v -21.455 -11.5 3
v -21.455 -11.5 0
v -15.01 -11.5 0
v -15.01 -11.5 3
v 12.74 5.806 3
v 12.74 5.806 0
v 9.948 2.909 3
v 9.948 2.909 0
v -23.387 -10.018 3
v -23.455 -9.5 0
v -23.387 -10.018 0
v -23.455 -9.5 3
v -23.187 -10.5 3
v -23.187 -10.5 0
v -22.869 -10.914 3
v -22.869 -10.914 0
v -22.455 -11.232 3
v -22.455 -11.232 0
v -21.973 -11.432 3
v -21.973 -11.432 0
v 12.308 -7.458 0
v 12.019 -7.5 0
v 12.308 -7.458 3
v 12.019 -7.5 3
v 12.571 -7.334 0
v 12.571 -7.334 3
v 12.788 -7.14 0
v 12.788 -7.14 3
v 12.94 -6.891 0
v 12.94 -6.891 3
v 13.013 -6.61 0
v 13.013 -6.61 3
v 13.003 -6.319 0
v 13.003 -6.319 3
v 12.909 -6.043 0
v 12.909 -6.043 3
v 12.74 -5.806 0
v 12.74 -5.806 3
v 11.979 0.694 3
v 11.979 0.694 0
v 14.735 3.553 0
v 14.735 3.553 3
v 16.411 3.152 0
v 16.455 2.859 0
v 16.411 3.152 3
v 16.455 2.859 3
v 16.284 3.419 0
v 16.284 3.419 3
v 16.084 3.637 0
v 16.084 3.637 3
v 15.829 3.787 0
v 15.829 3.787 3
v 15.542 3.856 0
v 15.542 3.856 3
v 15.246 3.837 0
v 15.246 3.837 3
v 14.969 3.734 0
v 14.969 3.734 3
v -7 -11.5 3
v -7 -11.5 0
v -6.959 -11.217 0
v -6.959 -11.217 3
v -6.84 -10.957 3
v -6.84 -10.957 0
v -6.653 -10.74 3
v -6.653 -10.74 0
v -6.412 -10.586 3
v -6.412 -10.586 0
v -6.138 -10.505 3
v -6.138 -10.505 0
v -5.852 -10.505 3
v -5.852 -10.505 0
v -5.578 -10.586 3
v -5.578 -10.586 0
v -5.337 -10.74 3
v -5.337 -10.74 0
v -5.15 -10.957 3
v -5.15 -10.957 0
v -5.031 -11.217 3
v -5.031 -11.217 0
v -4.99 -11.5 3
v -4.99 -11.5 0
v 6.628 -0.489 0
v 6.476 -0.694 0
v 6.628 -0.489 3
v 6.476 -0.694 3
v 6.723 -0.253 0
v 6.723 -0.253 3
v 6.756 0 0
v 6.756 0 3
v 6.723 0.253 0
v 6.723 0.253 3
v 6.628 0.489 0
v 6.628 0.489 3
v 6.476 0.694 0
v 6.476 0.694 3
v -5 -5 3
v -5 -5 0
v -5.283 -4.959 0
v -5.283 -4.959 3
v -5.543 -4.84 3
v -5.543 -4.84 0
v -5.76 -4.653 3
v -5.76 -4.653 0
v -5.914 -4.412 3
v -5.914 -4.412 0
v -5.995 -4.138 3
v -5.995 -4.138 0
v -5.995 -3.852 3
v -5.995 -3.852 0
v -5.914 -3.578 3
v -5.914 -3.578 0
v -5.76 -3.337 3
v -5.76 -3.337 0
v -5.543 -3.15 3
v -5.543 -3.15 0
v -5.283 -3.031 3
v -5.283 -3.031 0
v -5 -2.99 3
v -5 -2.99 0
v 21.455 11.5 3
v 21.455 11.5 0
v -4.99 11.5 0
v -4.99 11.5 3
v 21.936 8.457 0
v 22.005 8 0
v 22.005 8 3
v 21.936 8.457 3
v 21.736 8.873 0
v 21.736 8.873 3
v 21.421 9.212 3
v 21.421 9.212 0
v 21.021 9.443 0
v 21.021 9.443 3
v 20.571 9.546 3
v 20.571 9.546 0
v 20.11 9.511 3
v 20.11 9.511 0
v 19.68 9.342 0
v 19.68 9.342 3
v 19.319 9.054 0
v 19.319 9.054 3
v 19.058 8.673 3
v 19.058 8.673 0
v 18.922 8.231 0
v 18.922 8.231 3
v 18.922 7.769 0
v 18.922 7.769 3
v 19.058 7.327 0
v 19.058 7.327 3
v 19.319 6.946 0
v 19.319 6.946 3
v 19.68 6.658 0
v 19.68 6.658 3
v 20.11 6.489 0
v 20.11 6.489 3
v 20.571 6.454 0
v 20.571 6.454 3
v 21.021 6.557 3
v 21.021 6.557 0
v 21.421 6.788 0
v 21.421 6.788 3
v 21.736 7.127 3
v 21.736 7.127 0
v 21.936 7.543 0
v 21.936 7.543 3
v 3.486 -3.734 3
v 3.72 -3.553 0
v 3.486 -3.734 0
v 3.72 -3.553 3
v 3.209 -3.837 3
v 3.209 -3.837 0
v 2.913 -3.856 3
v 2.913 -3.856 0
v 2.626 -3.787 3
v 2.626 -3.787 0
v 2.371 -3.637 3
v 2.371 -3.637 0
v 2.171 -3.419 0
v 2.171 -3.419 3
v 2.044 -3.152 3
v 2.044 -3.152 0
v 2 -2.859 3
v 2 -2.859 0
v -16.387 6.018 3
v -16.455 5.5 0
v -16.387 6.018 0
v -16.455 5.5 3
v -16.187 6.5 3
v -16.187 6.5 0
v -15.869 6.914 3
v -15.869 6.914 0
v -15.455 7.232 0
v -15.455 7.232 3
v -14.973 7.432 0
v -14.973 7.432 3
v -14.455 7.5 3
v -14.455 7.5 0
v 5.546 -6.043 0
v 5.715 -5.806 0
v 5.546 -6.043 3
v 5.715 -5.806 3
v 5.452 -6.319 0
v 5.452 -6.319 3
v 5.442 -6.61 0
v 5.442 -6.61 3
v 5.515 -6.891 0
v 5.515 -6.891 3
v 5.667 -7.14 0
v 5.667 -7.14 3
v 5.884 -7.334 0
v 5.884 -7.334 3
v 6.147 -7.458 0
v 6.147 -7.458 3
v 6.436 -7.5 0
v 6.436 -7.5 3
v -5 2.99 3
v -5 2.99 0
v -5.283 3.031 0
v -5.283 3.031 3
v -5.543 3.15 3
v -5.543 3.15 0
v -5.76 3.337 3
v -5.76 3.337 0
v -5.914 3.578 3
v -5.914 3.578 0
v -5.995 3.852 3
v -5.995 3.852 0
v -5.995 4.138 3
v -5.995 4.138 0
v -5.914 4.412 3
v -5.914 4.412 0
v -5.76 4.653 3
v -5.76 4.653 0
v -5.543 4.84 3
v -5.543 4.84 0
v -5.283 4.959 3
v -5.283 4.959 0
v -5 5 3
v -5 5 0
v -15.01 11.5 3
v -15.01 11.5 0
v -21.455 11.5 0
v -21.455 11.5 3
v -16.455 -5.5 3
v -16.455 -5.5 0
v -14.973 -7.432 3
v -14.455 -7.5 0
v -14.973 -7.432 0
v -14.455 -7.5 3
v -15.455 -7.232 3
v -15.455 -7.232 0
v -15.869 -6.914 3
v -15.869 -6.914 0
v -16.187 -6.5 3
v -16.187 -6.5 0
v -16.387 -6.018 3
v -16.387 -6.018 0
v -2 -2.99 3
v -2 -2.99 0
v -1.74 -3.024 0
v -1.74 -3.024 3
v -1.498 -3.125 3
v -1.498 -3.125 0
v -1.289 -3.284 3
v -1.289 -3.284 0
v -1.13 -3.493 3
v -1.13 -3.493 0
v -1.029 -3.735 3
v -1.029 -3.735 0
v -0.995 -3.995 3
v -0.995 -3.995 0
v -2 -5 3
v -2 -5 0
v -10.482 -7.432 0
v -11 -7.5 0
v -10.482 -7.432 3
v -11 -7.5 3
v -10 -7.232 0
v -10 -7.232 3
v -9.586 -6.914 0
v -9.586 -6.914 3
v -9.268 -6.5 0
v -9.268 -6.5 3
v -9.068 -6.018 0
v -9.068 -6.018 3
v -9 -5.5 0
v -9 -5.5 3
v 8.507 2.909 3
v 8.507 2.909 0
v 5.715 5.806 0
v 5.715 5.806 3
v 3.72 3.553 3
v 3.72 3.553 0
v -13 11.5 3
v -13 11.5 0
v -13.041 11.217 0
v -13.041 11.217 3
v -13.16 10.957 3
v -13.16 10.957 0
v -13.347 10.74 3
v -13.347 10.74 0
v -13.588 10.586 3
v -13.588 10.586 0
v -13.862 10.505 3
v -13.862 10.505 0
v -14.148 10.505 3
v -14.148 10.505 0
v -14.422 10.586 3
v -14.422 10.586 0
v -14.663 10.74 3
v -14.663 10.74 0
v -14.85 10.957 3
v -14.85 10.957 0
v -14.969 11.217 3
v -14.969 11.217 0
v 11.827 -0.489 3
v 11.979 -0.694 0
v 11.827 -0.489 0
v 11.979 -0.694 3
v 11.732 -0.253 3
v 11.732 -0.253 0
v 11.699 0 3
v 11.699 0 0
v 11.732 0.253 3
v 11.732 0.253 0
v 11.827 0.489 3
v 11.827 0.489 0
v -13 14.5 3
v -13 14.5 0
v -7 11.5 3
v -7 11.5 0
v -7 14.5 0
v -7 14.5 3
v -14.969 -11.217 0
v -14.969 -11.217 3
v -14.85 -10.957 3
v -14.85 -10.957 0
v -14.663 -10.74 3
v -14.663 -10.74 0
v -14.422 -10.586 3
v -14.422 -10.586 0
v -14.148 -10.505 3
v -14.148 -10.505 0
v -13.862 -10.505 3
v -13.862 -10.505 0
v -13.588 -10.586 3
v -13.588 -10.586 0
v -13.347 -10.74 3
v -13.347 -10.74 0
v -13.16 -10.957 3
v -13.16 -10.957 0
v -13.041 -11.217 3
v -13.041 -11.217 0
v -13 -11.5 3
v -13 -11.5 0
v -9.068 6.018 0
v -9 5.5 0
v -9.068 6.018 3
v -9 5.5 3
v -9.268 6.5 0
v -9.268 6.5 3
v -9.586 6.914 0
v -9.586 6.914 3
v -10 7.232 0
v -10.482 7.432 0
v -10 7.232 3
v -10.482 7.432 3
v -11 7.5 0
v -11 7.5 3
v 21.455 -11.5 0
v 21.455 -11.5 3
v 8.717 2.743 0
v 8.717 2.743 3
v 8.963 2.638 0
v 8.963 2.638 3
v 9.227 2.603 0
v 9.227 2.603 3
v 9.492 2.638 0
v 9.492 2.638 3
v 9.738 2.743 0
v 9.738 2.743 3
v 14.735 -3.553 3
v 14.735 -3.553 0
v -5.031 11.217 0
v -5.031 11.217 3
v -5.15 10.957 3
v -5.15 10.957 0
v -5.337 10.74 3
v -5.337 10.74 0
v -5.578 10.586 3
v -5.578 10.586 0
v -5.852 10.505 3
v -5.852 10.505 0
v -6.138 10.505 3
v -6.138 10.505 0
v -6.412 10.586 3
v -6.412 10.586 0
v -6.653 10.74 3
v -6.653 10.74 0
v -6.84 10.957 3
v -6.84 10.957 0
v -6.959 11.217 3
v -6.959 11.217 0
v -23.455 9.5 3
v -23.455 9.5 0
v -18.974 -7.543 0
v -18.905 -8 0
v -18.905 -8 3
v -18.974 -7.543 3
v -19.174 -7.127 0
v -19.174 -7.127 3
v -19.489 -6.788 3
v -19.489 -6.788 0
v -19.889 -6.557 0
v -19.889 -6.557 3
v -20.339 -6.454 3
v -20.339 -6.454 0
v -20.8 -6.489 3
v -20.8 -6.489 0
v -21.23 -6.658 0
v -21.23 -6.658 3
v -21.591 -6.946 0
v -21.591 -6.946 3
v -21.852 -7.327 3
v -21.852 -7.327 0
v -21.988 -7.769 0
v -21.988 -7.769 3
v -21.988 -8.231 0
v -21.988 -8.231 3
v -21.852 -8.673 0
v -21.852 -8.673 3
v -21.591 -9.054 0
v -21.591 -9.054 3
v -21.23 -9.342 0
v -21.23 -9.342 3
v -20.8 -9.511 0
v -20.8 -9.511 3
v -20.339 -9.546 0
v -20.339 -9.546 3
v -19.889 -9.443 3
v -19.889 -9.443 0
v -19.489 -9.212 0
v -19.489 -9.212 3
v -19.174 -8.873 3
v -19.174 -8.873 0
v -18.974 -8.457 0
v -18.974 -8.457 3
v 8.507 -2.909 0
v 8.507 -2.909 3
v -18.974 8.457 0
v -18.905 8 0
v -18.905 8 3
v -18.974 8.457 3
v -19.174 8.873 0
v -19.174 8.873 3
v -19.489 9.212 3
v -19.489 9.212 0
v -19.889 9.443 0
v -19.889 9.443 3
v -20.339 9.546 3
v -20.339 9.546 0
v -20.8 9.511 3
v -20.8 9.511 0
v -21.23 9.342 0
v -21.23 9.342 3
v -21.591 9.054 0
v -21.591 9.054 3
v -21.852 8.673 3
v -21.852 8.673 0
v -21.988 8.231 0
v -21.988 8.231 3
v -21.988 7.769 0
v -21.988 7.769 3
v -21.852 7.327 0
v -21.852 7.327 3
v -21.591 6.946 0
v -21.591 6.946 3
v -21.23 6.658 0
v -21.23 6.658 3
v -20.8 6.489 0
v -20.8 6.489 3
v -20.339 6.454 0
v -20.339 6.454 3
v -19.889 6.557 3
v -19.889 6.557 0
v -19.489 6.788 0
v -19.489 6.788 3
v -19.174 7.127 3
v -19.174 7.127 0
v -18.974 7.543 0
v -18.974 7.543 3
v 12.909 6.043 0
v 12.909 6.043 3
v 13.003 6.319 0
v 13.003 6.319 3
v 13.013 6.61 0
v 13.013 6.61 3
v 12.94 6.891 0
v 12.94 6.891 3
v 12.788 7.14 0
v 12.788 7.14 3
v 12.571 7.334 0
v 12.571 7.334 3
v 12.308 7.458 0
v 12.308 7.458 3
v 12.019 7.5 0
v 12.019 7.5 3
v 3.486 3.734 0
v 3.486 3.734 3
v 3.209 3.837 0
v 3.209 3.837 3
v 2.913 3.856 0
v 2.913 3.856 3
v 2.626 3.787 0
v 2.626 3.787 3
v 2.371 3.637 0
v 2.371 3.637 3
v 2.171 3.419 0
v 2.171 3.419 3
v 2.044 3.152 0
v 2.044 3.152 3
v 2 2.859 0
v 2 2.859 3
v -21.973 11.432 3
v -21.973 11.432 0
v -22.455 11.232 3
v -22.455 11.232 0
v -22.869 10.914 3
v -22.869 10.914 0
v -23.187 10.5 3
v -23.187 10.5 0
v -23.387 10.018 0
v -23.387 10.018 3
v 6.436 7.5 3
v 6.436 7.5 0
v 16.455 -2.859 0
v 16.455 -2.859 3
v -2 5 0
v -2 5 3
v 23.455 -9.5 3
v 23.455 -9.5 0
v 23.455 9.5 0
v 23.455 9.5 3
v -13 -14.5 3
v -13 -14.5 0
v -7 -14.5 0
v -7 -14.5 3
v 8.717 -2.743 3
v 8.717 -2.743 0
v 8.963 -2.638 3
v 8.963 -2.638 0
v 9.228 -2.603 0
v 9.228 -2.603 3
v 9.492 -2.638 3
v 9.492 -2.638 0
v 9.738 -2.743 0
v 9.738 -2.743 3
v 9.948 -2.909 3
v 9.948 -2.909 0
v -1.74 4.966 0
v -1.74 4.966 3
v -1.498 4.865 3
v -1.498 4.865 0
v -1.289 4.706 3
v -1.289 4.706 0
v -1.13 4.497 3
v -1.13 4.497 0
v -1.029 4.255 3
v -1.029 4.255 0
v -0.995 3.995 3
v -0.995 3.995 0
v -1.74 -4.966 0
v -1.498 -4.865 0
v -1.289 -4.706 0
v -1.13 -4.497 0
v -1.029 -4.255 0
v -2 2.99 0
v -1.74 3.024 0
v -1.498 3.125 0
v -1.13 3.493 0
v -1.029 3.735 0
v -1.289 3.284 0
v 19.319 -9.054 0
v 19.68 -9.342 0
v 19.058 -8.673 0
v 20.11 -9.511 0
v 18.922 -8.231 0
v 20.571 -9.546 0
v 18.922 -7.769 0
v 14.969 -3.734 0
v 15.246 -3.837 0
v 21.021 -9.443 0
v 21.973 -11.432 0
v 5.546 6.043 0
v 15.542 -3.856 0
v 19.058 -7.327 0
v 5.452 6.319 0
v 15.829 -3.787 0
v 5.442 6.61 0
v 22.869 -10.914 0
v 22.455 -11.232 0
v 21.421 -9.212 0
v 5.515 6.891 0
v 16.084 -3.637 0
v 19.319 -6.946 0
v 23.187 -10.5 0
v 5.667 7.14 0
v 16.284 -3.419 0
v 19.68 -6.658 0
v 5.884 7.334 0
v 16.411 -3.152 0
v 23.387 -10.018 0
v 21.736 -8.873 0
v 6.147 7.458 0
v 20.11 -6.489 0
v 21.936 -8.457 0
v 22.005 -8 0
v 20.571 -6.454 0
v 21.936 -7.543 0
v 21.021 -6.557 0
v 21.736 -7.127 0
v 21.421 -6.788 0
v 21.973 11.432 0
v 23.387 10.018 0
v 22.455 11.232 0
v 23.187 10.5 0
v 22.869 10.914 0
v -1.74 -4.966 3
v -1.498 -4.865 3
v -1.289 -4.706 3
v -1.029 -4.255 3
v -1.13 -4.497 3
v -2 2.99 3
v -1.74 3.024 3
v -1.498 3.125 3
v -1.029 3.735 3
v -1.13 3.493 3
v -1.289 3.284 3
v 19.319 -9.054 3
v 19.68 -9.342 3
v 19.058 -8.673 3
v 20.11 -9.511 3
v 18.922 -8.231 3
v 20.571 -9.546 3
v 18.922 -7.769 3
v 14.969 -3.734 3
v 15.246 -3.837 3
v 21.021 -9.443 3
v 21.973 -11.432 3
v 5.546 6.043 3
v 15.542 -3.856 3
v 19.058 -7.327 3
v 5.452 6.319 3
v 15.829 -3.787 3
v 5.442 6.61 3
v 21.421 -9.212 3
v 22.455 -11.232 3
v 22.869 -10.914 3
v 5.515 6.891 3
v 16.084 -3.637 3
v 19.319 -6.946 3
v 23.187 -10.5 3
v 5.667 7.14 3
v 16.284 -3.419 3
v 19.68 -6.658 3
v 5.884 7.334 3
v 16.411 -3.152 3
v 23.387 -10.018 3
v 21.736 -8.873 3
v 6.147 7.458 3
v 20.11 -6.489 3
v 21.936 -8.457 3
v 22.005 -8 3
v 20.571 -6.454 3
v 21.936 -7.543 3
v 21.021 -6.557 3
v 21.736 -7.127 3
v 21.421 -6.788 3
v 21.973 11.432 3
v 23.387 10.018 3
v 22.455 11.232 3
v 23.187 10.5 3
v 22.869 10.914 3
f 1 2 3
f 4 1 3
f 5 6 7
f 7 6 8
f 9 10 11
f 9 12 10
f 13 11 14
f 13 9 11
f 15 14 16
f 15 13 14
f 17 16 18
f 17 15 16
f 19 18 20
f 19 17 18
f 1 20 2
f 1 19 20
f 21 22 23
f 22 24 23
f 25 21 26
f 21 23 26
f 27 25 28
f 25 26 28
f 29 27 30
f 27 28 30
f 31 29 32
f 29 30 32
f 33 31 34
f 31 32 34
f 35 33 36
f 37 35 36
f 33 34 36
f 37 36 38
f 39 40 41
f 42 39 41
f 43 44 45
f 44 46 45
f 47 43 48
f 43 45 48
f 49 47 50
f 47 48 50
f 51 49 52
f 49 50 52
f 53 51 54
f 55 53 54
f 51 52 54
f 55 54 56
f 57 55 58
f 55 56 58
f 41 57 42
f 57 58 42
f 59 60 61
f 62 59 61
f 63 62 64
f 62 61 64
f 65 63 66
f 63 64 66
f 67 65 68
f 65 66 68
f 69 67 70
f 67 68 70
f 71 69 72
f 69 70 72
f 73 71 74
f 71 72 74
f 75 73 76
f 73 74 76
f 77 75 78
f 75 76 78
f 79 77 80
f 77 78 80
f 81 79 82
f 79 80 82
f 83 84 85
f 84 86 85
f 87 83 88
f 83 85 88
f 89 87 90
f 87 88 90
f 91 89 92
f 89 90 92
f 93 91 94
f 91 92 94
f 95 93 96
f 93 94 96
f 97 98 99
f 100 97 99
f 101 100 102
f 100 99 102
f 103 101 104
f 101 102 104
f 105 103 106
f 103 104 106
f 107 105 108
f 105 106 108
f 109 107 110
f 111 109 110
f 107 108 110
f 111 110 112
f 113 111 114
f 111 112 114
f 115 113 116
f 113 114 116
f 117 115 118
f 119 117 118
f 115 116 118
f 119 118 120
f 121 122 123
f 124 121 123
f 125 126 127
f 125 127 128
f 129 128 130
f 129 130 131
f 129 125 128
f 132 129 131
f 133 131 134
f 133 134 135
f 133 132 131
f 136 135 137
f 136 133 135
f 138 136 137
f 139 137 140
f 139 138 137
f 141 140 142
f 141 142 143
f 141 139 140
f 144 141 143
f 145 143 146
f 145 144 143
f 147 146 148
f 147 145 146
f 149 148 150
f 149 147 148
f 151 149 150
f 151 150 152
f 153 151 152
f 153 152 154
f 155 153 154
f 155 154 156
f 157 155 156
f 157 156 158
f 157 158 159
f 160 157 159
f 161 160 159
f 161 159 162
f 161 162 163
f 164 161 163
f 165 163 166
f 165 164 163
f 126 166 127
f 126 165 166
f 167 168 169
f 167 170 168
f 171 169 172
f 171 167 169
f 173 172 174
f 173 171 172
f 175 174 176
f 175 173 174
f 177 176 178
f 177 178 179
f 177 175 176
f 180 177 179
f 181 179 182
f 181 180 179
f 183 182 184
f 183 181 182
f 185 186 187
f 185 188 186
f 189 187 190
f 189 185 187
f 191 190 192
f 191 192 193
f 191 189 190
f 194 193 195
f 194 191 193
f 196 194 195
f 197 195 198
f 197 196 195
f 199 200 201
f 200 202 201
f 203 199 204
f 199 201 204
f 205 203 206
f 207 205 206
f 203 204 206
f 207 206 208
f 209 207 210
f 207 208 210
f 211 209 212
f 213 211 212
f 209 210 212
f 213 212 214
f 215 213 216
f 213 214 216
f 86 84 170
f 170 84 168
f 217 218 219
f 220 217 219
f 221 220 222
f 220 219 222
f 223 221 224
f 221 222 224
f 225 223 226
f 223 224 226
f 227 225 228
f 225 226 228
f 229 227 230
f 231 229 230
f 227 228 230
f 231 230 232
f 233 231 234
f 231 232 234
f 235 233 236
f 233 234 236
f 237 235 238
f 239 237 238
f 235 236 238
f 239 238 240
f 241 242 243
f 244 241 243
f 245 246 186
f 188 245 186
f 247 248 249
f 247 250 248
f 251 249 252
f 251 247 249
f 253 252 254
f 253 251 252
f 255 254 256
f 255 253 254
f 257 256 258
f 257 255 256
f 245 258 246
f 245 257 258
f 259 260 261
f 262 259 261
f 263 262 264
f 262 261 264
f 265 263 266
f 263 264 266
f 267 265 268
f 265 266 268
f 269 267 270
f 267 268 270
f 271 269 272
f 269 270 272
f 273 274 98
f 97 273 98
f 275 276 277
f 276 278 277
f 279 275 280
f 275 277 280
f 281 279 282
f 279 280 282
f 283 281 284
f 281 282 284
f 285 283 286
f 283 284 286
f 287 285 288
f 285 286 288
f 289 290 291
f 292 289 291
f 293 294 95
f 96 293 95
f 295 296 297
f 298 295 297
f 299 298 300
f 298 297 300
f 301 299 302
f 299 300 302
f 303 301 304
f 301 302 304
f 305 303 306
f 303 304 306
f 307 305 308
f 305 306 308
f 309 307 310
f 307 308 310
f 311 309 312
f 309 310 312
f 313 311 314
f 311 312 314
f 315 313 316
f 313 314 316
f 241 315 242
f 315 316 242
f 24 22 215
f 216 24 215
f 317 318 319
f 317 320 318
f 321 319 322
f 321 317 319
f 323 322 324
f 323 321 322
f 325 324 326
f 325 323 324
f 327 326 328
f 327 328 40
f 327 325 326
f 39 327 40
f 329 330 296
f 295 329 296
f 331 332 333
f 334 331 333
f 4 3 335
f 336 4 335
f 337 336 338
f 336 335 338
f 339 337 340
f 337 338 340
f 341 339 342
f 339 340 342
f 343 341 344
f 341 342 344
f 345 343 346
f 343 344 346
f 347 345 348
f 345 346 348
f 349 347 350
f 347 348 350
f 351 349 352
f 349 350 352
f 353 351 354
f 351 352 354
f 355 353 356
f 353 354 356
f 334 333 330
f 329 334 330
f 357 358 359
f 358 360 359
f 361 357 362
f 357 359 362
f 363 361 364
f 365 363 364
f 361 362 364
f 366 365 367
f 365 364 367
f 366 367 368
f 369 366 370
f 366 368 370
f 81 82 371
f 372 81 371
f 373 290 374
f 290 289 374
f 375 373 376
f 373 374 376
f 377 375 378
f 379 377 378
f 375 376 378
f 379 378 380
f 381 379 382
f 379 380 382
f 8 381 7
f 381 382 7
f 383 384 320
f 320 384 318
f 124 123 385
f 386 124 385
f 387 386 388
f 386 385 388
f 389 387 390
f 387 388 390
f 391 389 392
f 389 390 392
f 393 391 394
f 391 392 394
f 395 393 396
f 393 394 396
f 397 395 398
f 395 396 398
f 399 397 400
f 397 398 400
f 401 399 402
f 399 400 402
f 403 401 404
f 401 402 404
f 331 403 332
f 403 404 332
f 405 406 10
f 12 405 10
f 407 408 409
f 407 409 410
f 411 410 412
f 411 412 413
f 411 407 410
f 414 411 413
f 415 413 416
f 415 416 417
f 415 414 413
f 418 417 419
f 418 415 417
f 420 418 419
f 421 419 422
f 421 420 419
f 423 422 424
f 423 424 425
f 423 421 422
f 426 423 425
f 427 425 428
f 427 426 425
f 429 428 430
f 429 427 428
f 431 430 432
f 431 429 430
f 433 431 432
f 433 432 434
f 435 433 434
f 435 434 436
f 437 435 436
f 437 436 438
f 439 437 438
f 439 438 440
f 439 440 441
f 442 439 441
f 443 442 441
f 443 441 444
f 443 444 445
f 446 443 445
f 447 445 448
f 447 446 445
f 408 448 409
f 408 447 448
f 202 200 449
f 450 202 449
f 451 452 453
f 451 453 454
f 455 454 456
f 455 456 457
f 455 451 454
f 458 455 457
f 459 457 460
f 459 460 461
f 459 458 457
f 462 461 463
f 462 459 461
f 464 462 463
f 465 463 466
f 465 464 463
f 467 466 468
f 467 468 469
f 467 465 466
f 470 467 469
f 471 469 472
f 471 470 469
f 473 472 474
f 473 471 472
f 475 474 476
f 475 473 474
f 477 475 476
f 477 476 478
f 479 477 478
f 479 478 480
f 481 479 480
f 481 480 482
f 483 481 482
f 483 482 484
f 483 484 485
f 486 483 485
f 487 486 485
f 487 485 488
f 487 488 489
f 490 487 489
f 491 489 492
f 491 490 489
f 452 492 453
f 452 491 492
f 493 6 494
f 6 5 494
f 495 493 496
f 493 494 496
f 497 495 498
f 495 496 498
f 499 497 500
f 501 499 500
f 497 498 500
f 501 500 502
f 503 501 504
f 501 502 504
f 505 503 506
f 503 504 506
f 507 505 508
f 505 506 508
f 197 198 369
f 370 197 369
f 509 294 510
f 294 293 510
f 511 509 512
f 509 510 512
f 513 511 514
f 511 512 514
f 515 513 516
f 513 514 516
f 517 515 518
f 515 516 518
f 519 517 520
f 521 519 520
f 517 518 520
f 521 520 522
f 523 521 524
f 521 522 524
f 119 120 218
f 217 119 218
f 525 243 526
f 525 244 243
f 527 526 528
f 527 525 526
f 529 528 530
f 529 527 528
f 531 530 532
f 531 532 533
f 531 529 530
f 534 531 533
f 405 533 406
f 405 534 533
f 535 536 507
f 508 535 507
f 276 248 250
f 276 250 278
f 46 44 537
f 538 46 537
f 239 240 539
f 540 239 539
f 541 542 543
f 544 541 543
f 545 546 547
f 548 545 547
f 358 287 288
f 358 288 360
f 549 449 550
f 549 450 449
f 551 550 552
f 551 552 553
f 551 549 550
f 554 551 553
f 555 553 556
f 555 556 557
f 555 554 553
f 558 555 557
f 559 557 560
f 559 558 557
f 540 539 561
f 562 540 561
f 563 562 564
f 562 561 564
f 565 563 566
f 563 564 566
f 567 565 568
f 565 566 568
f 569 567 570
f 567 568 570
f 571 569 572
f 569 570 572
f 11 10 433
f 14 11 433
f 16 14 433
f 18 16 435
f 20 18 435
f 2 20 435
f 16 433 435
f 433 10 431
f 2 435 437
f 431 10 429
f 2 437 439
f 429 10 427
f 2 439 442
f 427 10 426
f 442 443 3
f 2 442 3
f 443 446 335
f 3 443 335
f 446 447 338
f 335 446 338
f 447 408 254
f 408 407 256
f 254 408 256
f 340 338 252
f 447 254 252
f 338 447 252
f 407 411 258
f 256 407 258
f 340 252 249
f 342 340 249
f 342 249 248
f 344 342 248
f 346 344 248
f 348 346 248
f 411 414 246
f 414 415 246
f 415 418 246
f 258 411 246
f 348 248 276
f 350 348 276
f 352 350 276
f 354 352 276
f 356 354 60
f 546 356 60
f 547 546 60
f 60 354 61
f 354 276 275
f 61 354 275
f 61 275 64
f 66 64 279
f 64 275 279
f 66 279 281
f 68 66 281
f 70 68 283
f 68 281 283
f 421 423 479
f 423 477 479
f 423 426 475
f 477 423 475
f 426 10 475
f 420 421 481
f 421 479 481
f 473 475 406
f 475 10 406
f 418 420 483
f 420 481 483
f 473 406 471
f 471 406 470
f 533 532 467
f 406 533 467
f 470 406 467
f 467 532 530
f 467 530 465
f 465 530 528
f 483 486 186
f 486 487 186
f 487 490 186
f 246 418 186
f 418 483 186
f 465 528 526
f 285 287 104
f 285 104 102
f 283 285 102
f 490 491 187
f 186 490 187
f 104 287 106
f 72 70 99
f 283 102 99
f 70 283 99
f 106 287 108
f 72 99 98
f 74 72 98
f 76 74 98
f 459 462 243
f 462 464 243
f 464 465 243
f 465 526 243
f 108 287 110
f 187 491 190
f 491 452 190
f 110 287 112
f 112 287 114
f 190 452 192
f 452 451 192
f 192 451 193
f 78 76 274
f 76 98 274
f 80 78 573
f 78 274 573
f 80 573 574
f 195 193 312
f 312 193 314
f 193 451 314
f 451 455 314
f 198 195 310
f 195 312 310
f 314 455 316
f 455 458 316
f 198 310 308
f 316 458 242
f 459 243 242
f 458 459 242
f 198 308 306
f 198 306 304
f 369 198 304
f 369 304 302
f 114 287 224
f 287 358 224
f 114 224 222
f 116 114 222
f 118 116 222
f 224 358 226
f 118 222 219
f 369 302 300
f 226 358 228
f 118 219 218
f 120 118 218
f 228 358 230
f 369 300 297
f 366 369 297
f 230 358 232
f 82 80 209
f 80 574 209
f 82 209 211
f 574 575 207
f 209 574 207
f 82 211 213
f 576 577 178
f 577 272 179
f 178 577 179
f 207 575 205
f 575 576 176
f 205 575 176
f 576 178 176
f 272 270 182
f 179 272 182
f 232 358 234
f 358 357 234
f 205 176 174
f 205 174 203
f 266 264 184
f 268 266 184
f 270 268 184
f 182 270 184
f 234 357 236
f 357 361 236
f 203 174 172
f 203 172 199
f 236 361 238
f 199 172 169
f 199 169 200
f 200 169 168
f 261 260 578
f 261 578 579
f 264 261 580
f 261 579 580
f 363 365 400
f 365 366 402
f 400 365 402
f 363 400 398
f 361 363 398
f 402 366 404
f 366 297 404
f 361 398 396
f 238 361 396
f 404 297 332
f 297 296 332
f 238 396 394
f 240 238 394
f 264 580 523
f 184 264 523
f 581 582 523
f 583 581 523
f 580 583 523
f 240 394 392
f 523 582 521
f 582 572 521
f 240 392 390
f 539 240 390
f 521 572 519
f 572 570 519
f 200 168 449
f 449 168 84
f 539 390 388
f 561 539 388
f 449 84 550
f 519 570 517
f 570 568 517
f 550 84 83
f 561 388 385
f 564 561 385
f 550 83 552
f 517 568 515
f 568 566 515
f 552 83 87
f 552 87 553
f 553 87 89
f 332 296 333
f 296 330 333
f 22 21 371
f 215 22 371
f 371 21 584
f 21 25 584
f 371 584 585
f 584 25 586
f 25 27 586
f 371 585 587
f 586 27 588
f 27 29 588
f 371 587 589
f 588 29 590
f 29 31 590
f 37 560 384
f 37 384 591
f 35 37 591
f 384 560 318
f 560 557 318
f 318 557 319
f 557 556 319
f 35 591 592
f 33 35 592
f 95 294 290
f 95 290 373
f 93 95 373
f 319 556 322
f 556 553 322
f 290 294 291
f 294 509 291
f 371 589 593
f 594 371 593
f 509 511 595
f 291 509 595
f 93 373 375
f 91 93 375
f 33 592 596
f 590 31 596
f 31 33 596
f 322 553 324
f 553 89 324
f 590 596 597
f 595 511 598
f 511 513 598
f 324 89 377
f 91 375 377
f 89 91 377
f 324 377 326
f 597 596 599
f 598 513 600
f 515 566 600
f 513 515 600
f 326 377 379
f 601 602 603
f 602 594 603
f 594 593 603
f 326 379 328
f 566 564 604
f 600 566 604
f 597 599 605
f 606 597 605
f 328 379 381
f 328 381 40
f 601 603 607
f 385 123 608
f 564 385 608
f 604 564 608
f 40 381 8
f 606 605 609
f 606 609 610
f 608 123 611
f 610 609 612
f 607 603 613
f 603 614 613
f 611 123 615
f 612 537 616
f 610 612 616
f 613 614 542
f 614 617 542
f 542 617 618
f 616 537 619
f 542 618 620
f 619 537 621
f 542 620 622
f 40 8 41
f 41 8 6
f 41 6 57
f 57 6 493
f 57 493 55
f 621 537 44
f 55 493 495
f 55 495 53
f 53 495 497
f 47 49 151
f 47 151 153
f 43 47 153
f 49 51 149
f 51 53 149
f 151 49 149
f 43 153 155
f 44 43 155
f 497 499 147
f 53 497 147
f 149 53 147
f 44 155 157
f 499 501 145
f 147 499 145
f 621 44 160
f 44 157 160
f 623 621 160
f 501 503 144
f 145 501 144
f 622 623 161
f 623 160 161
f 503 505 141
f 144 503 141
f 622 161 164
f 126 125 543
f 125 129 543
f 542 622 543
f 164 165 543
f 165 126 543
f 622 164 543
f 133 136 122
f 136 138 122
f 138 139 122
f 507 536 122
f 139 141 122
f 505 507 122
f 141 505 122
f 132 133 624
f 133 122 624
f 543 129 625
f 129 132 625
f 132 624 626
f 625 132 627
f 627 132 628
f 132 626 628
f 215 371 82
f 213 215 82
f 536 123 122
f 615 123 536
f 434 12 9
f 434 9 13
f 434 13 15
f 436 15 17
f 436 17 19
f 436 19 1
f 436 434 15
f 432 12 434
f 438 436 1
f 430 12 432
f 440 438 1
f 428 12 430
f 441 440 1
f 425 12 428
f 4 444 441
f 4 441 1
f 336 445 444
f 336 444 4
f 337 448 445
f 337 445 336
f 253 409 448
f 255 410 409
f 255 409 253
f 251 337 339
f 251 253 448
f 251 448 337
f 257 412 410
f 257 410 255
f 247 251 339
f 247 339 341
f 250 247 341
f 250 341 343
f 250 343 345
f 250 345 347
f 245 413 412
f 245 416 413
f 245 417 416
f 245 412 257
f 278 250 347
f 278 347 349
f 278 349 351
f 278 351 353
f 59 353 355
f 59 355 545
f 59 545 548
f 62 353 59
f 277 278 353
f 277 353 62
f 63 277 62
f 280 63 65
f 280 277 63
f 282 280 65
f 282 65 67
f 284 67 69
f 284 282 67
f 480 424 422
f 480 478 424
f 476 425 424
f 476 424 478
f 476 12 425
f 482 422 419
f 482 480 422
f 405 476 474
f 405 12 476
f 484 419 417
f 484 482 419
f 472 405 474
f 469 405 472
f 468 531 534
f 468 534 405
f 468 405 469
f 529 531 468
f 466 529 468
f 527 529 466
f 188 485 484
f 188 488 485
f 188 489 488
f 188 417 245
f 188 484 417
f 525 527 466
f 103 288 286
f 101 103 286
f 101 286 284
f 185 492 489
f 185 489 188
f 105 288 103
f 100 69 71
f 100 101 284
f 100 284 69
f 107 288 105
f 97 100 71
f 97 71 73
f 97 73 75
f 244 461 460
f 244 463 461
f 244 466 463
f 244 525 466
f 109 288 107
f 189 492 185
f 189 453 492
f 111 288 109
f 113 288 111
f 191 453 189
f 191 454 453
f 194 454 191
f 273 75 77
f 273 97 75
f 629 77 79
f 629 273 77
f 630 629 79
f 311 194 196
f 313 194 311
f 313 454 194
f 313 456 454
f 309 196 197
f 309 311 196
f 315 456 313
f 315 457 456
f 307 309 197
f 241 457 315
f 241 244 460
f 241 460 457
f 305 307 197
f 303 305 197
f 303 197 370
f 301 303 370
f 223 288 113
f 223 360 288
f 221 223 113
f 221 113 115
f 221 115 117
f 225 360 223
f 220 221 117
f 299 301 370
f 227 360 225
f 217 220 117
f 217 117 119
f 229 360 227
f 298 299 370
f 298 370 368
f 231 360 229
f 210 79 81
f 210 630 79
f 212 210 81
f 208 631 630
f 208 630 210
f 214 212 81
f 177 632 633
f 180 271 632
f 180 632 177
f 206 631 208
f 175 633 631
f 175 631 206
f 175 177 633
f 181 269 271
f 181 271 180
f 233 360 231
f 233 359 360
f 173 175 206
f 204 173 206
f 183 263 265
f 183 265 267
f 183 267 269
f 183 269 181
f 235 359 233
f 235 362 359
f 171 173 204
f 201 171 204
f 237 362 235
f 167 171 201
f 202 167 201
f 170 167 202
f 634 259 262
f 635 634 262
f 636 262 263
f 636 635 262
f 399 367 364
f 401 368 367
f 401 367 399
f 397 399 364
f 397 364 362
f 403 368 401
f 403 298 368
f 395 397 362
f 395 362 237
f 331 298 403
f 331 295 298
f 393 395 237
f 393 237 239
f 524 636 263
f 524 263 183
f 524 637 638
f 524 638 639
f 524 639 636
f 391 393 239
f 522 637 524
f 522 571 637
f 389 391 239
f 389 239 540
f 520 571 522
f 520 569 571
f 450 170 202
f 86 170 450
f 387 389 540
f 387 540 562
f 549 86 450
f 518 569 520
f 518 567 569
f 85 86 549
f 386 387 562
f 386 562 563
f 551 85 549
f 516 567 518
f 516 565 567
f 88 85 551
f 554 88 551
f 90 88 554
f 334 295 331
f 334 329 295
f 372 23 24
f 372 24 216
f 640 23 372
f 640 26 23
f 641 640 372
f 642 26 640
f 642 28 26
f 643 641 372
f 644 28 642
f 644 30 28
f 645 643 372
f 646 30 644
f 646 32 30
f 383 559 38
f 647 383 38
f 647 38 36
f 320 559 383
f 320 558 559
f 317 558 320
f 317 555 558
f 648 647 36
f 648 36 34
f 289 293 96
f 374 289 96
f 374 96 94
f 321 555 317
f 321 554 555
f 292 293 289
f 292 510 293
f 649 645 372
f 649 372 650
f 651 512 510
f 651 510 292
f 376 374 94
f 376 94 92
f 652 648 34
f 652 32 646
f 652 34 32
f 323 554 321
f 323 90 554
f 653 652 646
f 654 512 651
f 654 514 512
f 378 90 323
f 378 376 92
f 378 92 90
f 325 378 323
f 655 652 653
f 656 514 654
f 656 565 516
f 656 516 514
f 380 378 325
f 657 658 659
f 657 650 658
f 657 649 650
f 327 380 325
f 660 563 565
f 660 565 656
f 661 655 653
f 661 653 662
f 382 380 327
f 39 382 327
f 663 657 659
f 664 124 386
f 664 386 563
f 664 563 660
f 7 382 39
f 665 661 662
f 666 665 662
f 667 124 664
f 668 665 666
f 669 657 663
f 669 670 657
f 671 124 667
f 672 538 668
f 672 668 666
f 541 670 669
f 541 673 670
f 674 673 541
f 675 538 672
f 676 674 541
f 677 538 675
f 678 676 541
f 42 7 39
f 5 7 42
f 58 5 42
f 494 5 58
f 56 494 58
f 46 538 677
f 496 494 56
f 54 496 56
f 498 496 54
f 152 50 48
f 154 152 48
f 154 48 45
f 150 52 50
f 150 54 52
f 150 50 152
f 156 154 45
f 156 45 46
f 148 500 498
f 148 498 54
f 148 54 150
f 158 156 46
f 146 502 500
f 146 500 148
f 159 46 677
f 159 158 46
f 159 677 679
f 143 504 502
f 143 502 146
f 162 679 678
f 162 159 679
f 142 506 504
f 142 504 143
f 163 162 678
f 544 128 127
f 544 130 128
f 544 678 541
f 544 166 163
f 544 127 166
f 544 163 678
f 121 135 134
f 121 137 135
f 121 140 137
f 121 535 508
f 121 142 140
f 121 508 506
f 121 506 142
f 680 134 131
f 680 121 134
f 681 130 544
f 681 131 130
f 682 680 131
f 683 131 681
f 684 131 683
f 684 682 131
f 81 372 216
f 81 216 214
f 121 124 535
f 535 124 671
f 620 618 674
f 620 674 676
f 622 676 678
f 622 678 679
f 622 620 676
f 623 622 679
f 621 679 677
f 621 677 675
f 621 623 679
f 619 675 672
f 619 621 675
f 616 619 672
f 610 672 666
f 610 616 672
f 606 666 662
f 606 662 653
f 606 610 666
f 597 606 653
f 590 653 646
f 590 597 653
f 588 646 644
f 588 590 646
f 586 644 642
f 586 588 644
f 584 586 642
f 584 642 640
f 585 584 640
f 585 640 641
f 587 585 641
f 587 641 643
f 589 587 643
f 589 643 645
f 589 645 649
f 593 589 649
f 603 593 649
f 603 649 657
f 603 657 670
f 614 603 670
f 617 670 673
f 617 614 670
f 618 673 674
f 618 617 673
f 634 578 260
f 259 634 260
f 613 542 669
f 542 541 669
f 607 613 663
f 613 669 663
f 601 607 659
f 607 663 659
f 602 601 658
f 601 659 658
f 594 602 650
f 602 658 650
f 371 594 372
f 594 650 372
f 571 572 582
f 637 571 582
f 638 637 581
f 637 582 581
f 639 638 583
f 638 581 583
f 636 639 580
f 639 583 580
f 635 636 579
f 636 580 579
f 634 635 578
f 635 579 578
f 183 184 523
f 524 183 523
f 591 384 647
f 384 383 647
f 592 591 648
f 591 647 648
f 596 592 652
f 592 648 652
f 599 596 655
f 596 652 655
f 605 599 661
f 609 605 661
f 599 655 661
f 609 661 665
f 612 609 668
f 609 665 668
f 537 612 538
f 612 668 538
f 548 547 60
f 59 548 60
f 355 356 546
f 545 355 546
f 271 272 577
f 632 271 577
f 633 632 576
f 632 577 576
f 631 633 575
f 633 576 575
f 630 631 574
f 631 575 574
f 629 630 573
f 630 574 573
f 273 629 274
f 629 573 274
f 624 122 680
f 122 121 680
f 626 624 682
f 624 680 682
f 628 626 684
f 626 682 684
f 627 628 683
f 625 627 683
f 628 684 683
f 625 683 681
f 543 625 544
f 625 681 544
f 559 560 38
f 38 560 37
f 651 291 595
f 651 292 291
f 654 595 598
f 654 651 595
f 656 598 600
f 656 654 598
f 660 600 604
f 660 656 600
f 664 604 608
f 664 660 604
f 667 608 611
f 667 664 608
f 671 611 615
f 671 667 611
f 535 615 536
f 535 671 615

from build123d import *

# Parameters (mm, degrees)
SKETCH_1_R      = 1.55
SKETCH_1_W      = 7.455
SKETCH_1_H      = 15
EXTRUDE_1_DEPTH = 3
FILLET_1_R      = 2
FILLET_2_R      = 1


with BuildPart() as part:
    # 草图1 → 凸台-拉伸1 (new body)
    with BuildSketch(Plane.XY):
        with BuildLine():
            Line((-13, 14.5), (-13, 11.5))
            ThreePointArc((-13, 11.5), (-14.005, 10.495), (-15.01, 11.5))
            Line((-15.01, 11.5), (-23.455, 11.5))
            Line((-23.455, 11.5), (-23.455, -11.5))
            Line((-23.455, -11.5), (-15.01, -11.5))
            ThreePointArc((-15.01, -11.5), (-14.005, -10.495), (-13, -11.5))
            Line((-13, -11.5), (-13, -14.5))
            Line((-13, -14.5), (-7, -14.5))
            Line((-7, -14.5), (-7, -11.5))
            ThreePointArc((-7, -11.5), (-5.995, -10.495), (-4.99, -11.5))
            Line((-4.99, -11.5), (23.455, -11.5))
            Line((23.455, -11.5), (23.455, 11.5))
            Line((23.455, 11.5), (-4.99, 11.5))
            ThreePointArc((-4.99, 11.5), (-5.995, 10.495), (-7, 11.5))
            Line((-7, 11.5), (-7, 14.5))
            Line((-7, 14.5), (-13, 14.5))
        make_face()
        with Locations((-20.455, -8)):
            Circle(SKETCH_1_R, mode=Mode.SUBTRACT)
        with Locations((20.455, -8)):
            Circle(SKETCH_1_R, mode=Mode.SUBTRACT)
        Polygon((9.2275, -2.161680579), (14.371860482, -7.5), (4.083139518, -7.5), align=None, mode=Mode.SUBTRACT)
        with Locations((-12.7275, 0)):
            Rectangle(SKETCH_1_W, SKETCH_1_H, mode=Mode.SUBTRACT)
        with BuildLine():
            ThreePointArc((-0.995, -3.995), (-1.289357685, -4.705642315), (-2, -5))
            Line((-2, -5), (-5, -5))
            ThreePointArc((-5, -5), (-6.005, -3.995), (-5, -2.99))
            Line((-5, -2.99), (-5, 2.99))
            ThreePointArc((-5, 2.99), (-6.005, 3.995), (-5, 5))
            Line((-5, 5), (-2, 5))
            ThreePointArc((-2, 5), (-1.289357685, 4.705642315), (-0.995, 3.995))
            ThreePointArc((-0.995, 3.995), (-1.289357685, 3.284357685), (-2, 2.99))
            Line((-2, 2.99), (-2, -2.99))
            ThreePointArc((-2, -2.99), (-1.289357685, -3.284357685), (-0.995, -3.995))
        make_face(mode=Mode.SUBTRACT)
        with Locations((-20.455, 8)):
            Circle(SKETCH_1_R, mode=Mode.SUBTRACT)
        Polygon((2, -5.338319421), (2, 5.338319421), (7.144360482, 0), align=None, mode=Mode.SUBTRACT)
        Polygon((4.083139518, 7.5), (14.371860482, 7.5), (9.2275, 2.161680579), align=None, mode=Mode.SUBTRACT)
        Polygon((11.310639518, 0), (16.455, 5.338319421), (16.455, -5.338319421), align=None, mode=Mode.SUBTRACT)
        with Locations((20.455, 8)):
            Circle(SKETCH_1_R, mode=Mode.SUBTRACT)
    extrude(amount=EXTRUDE_1_DEPTH)

    # 圆角1
    fillet_1_edges = [part.edges().sort_by_distance(p)[0] for p in [
        (-23.455, -11.5, 1.5),
        (-23.455, 11.5, 1.5),
        (23.455, 11.5, 1.5),
        (23.455, -11.5, 1.5),
        (-16.455, -7.5, 1.5),
        (-9, -7.5, 1.5),
        (-9, 7.5, 1.5),
        (-16.455, 7.5, 1.5),
    ]]
    fillet(fillet_1_edges, radius=FILLET_1_R)

    # 圆角2
    fillet_2_edges = [part.edges().sort_by_distance(p)[0] for p in [
        (16.455, -5.338319421, 1.5),
        (16.455, 5.338319421, 1.5),
        (11.310639518, 0, 1.5),
        (14.371860482, -7.5, 1.5),
        (9.2275, -2.161680579, 1.5),
        (4.083139518, -7.5, 1.5),
        (2, 5.338319421, 1.5),
        (2, -5.338319421, 1.5),
        (7.144360482, 0, 1.5),
        (14.371860482, 7.5, 1.5),
        (4.083139518, 7.5, 1.5),
        (9.2275, 2.161680579, 1.5),
    ]]
    fillet(fillet_2_edges, radius=FILLET_2_R)


solid = part.part
